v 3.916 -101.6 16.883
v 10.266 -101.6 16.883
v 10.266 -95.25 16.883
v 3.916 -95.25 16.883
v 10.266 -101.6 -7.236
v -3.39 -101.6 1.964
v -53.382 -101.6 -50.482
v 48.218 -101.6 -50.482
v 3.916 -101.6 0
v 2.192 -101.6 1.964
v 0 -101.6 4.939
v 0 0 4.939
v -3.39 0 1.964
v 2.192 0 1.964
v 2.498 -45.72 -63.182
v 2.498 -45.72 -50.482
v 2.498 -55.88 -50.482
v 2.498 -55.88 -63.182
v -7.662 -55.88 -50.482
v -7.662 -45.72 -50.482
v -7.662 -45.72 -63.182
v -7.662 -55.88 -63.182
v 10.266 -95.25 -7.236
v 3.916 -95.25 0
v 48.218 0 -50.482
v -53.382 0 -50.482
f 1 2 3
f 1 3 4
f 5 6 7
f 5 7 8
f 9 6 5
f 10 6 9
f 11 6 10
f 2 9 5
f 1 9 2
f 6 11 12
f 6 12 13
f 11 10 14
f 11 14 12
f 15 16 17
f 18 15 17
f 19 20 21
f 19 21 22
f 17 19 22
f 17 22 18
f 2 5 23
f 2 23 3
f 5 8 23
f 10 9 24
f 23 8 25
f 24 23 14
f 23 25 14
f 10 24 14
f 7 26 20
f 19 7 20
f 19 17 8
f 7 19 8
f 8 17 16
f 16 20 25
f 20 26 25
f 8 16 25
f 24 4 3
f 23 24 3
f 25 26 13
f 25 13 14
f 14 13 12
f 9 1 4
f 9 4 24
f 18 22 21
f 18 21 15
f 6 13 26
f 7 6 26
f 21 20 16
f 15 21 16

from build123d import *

# Parameters (mm, degrees)
F1_DEPTH = 101.6
F3_DEPTH = 6.35
F4_W     = 10.16
F4_H     = 10.16
F5_DEPTH = 12.7
F6_W     = 10.16
F6_H     = 10.16
F7_DEPTH = 12.7


with BuildPart() as f1:
    # F0 (on Front) → F1 (new body)
    with BuildSketch(Plane.XZ):
        Polygon((-3.390036, 1.964426), (-53.382213, -50.482459), (48.217787, -50.482459), (2.192216, 1.964426), (0, 4.939404), align=None)
    extrude(amount=F1_DEPTH)

    # F2 (on face) → F3 (join)
    with BuildSketch(Plane.XZ.offset(101.6)):
        Polygon((3.916128, 16.882844), (3.916128, 0), (10.266128, -7.235928), (10.266128, 16.882844), align=None)
    extrude(amount=-F3_DEPTH)

    # F4 (on face) → F5 (join)
    with BuildSketch(Plane(origin=(0, 0, -50.482459), x_dir=(1, 0, 0), z_dir=(0, 0, -1))):
        with Locations((-2.582213, 50.8)):
            Rectangle(F4_W, F4_H)
    extrude(amount=-F5_DEPTH)

    # F6 (on face) → F7 (join)
    with BuildSketch(Plane(origin=(0, 0, -50.482459), x_dir=(1, 0, 0), z_dir=(0, 0, -1))):
        with Locations((-2.582213, 50.8)):
            Rectangle(F6_W, F6_H)
    extrude(amount=F7_DEPTH)


solid = f1.part
